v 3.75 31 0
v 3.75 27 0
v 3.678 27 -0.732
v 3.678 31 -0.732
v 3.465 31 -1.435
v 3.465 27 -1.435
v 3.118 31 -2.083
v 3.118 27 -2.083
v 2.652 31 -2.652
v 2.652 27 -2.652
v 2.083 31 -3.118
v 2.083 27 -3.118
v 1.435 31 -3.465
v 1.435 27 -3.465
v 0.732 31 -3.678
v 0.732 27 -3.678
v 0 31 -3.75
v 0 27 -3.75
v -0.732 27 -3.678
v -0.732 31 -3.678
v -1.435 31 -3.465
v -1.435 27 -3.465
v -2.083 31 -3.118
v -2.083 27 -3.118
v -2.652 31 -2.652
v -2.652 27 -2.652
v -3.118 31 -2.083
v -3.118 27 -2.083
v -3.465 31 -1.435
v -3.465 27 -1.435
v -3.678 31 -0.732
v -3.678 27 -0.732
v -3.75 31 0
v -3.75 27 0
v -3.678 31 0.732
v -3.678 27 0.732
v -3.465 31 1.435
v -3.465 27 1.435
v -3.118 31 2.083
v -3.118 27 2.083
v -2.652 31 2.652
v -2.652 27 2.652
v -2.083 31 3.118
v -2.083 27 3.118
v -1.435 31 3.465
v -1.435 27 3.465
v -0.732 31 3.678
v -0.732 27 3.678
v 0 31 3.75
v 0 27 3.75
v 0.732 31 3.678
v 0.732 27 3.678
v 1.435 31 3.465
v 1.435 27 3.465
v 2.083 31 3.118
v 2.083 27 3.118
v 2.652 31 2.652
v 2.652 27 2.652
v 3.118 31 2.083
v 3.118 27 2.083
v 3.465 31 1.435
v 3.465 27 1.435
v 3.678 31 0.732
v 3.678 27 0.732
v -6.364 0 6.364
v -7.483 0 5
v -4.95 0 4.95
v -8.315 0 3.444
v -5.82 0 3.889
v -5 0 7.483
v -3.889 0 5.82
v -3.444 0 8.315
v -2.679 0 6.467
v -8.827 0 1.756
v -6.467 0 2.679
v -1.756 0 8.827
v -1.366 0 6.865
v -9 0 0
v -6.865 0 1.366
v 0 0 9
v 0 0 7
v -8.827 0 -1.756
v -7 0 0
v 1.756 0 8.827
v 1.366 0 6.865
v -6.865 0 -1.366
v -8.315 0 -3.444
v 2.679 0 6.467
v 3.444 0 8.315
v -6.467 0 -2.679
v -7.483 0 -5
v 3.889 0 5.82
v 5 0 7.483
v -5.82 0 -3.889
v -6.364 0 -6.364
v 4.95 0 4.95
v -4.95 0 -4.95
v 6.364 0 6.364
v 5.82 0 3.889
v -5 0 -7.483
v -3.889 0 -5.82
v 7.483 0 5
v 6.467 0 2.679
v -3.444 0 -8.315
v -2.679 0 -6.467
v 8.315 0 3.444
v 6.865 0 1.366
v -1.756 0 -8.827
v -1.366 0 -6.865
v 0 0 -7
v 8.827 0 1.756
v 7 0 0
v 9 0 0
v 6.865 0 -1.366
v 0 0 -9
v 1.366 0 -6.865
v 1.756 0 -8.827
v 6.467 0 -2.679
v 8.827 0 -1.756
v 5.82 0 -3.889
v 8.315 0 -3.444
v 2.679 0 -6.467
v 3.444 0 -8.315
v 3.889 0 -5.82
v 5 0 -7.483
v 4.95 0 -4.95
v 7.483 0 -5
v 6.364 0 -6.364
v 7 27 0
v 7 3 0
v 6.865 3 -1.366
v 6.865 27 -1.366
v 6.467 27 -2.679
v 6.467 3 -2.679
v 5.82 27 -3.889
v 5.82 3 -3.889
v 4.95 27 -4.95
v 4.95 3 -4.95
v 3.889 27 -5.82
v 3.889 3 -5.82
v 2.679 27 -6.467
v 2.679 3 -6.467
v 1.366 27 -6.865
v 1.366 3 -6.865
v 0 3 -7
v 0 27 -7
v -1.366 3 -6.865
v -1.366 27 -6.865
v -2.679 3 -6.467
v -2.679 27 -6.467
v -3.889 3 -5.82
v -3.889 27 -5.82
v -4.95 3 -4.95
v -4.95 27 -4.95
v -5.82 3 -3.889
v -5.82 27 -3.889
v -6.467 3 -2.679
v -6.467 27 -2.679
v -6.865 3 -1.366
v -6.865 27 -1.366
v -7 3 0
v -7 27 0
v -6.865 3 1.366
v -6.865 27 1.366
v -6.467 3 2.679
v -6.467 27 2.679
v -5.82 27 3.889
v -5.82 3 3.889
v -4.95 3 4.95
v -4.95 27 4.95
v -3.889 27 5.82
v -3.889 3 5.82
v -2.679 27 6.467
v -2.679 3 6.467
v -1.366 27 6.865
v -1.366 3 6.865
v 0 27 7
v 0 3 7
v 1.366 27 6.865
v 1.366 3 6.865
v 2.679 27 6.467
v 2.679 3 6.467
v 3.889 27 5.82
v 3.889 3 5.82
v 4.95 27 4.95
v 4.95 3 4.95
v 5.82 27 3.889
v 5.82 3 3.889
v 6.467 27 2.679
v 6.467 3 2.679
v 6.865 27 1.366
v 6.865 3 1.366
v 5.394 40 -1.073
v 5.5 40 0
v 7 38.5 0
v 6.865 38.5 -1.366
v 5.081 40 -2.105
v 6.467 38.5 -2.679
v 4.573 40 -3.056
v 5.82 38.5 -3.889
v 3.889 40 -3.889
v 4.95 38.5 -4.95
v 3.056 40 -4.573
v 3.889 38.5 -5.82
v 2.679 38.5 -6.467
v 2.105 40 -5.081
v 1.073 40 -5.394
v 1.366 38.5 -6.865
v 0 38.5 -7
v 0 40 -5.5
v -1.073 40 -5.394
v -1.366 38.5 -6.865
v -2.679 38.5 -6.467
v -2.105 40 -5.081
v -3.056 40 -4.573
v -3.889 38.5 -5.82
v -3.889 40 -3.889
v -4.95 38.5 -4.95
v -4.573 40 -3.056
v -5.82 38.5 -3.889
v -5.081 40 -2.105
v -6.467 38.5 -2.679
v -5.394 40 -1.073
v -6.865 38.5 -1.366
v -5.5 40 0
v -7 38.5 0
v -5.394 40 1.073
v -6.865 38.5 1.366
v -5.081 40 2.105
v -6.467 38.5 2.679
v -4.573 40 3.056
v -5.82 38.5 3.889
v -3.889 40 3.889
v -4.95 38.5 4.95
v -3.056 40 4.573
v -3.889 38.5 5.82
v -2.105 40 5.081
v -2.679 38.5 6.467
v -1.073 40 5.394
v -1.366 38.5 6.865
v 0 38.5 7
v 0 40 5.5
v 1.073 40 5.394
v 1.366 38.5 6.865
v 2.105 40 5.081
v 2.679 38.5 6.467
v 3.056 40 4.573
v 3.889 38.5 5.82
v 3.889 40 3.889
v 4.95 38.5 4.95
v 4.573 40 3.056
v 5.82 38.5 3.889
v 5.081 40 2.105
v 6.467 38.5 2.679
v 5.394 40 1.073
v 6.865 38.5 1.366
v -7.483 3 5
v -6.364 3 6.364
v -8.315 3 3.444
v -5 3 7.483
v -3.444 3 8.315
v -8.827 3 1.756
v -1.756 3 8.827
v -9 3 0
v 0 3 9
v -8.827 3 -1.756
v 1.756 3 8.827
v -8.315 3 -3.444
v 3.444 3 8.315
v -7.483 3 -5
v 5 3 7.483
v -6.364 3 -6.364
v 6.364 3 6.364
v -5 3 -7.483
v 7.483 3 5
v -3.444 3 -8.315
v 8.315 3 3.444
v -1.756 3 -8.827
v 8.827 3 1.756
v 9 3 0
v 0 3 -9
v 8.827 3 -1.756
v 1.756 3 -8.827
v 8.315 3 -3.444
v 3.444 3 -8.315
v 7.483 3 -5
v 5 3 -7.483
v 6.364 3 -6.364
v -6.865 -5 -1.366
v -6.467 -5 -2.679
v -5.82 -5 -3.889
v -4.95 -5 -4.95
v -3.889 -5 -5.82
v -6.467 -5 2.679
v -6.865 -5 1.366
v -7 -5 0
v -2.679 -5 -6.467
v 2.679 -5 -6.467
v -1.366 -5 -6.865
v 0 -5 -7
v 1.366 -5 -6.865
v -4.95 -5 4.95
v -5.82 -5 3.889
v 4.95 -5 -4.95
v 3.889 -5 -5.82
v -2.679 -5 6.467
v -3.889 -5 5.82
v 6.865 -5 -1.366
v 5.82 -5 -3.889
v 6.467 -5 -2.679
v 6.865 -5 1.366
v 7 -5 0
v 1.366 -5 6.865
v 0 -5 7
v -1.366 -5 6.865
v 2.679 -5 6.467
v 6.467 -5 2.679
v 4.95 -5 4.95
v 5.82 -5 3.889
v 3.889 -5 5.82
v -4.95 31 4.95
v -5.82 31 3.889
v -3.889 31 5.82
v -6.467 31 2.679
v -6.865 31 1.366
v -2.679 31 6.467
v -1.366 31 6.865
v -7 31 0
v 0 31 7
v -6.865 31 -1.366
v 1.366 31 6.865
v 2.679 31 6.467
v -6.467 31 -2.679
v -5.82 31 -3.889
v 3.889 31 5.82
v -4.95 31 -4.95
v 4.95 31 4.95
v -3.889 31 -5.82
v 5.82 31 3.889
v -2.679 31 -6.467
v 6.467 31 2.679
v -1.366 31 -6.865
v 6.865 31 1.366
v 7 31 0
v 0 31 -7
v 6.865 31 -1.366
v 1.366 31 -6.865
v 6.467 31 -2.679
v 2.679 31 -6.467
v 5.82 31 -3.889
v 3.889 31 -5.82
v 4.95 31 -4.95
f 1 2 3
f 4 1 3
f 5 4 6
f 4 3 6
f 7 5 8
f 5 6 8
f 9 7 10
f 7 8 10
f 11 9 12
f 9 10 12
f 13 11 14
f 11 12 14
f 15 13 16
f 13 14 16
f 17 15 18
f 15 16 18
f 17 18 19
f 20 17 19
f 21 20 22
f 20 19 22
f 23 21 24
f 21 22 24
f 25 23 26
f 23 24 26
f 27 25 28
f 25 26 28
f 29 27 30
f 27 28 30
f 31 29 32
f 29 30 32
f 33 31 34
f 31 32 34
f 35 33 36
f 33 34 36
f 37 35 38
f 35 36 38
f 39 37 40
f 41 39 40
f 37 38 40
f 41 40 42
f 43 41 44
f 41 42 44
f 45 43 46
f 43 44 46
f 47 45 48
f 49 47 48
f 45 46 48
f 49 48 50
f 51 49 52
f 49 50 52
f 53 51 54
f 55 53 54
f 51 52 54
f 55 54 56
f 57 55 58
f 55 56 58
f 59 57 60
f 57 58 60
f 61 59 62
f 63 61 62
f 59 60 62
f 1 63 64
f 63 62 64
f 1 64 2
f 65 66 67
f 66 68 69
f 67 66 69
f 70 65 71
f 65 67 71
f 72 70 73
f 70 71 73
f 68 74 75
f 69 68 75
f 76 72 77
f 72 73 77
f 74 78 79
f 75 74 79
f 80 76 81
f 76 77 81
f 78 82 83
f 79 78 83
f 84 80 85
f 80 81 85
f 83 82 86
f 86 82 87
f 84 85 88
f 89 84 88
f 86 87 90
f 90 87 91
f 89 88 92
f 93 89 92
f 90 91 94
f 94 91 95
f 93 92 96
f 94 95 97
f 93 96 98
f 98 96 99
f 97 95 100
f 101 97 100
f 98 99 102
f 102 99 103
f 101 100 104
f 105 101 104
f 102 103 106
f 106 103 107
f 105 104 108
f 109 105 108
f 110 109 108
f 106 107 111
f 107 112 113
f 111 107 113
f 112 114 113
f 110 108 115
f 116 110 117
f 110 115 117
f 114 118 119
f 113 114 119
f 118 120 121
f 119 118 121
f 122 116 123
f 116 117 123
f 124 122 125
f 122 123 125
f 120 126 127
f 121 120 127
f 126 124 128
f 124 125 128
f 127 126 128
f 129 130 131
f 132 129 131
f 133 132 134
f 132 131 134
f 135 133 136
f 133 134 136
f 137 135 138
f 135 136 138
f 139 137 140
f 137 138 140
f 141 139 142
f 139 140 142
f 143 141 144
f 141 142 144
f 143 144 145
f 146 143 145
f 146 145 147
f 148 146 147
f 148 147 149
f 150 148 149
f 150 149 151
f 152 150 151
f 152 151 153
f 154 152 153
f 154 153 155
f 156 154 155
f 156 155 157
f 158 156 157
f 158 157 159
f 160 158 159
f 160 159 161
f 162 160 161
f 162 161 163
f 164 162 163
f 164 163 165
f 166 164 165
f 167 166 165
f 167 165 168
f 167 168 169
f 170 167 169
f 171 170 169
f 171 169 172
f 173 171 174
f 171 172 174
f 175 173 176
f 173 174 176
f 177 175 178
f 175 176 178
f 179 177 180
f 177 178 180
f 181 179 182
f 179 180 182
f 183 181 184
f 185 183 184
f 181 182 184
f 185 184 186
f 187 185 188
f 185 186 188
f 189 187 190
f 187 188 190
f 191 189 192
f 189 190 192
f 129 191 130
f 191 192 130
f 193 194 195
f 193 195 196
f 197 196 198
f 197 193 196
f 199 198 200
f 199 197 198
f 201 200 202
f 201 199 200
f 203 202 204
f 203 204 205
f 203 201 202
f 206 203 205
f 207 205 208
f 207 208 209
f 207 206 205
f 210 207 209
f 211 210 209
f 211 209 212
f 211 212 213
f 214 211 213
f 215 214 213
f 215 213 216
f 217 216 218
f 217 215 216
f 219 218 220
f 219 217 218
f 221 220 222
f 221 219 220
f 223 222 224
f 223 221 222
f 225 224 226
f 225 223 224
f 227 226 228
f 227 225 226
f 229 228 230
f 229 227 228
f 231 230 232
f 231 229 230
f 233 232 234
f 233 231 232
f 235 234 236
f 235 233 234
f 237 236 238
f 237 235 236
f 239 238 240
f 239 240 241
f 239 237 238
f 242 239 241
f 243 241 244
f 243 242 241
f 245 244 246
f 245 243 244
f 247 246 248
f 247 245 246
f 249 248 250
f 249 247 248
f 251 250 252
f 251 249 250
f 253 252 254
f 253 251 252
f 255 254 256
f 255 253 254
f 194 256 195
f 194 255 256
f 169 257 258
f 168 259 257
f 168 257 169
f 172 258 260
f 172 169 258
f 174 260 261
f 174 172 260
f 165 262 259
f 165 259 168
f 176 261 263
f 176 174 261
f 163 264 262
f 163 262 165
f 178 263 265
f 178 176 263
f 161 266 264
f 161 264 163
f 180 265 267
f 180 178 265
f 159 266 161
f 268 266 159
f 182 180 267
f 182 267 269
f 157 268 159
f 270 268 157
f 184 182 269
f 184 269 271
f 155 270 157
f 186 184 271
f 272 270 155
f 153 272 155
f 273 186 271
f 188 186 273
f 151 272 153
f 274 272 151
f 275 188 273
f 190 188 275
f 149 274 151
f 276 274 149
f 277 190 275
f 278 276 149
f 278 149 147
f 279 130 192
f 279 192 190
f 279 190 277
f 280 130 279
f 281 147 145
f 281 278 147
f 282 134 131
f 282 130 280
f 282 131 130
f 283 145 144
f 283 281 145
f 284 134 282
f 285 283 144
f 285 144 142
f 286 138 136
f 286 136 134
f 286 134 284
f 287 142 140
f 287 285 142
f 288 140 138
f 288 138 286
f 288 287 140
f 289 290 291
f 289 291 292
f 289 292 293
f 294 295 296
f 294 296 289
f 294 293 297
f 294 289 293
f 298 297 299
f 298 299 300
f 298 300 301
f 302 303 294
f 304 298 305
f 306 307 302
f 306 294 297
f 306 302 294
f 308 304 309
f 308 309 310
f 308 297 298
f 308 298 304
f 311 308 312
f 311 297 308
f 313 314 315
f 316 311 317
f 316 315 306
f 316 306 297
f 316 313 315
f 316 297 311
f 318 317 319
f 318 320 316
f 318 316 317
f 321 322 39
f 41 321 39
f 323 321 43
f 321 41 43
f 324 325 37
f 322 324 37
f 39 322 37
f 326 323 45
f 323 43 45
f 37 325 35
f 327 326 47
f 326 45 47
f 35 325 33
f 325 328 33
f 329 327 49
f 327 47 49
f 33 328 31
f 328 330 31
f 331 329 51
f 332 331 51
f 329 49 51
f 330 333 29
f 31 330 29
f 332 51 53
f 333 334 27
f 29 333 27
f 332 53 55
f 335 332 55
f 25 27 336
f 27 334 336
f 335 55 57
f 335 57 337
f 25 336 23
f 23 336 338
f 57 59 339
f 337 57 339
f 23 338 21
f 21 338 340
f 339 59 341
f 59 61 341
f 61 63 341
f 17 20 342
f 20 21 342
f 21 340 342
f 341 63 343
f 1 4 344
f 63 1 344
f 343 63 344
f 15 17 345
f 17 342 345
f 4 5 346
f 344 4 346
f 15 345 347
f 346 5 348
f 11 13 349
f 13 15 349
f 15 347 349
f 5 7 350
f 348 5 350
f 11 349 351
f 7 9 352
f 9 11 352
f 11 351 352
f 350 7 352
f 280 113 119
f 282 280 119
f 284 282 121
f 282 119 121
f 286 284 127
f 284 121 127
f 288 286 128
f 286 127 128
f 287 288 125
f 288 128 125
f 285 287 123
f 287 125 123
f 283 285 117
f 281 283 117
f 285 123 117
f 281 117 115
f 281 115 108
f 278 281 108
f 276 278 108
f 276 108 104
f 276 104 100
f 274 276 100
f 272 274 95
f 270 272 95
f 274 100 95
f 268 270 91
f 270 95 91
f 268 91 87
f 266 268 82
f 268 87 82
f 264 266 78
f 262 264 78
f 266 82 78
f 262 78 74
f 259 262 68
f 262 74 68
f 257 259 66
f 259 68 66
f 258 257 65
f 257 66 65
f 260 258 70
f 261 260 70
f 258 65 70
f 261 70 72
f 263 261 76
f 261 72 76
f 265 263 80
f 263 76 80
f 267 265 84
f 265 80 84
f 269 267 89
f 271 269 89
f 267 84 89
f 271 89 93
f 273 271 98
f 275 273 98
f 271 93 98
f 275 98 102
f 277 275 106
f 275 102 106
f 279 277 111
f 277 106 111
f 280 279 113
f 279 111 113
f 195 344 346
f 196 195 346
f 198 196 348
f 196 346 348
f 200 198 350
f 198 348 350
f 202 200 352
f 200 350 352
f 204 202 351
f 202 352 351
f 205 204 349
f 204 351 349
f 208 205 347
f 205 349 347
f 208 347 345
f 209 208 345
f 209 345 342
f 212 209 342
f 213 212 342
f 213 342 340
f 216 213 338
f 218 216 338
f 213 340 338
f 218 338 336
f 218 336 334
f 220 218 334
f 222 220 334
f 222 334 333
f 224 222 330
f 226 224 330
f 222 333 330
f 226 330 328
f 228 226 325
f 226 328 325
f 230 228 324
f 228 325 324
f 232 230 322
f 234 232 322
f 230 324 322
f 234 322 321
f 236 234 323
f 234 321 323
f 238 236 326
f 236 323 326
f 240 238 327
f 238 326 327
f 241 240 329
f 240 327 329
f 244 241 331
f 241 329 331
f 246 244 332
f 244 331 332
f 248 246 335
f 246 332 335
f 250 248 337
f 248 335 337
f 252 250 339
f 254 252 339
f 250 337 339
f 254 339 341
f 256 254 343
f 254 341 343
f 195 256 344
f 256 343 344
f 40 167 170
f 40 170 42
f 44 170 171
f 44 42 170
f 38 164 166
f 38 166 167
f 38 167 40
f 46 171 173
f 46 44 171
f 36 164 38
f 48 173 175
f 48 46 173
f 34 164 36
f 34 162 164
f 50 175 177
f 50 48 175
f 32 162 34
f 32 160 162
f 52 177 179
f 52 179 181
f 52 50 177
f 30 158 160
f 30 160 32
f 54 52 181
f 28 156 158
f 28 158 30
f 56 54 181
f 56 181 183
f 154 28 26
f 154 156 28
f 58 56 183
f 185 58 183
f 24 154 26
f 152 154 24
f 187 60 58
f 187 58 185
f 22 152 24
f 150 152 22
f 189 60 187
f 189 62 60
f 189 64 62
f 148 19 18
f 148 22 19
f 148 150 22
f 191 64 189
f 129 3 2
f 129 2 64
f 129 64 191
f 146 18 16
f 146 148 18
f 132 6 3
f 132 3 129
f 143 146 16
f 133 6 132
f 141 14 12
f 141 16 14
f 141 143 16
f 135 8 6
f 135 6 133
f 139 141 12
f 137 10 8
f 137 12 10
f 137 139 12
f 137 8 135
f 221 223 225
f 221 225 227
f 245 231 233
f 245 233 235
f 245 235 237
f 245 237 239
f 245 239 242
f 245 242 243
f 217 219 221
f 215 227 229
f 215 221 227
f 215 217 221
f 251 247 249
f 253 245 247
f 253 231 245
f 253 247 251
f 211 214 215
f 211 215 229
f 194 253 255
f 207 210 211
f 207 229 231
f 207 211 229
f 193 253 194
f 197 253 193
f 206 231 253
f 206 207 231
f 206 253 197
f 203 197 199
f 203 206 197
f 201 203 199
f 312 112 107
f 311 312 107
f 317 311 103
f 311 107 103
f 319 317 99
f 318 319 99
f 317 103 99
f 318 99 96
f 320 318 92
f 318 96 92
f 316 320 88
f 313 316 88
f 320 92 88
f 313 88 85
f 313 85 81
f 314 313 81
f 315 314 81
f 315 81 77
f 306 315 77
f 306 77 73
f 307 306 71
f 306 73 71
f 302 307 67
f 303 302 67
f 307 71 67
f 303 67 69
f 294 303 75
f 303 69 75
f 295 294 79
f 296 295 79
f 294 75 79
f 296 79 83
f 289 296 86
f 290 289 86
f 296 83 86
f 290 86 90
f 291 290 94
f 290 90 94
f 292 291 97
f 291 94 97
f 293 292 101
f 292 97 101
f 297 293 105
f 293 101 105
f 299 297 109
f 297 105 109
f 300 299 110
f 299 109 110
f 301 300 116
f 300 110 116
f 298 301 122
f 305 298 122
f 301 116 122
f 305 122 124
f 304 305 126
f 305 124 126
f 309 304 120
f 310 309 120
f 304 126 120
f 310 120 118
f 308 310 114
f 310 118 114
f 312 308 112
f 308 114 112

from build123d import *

# Parameters (mm, degrees)
CROQUIS1_R              = 9
SALIENTE_EXTRUIR1_DEPTH = 3
CROQUIS2_R              = 7
SALIENTE_EXTRUIR2_DEPTH = 27
CROQUIS4_R              = 3.75
SALIENTE_EXTRUIR3_DEPTH = 4
CROQUIS5_R              = 7
SALIENTE_EXTRUIR4_DEPTH = 9
CROQUIS7_R              = 7
SALIENTE_EXTRUIR5_DEPTH = 5
CHAFL_N1_SIZE           = 1.5


with BuildPart() as part:
    # Croquis1 → Saliente-Extruir1 (new body)
    with BuildSketch(Plane(origin=(0, 0, 0), x_dir=(1, 0, 0), z_dir=(0, 1, 0))):
        Circle(CROQUIS1_R)
    extrude(amount=SALIENTE_EXTRUIR1_DEPTH)

    # Croquis2 → Saliente-Extruir2 (add)
    with BuildSketch(Plane(origin=(0, 0, 0), x_dir=(1, 0, 0), z_dir=(0, 1, 0))):
        Circle(CROQUIS2_R)
    extrude(amount=SALIENTE_EXTRUIR2_DEPTH)

    # Croquis4 → Saliente-Extruir3 (add)
    with BuildSketch(Plane(origin=(0, 27, 0), x_dir=(1, 0, 0), z_dir=(0, 1, 0))):
        Circle(CROQUIS4_R)
    extrude(amount=SALIENTE_EXTRUIR3_DEPTH)

    # Croquis5 → Saliente-Extruir4 (add)
    with BuildSketch(Plane(origin=(0, 31, 0), x_dir=(1, 0, 0), z_dir=(0, 1, 0))):
        Circle(CROQUIS5_R)
    extrude(amount=SALIENTE_EXTRUIR4_DEPTH)

    # Croquis7 → Saliente-Extruir5 (add)
    with BuildSketch(Plane.XZ):
        Circle(CROQUIS7_R)
    extrude(amount=SALIENTE_EXTRUIR5_DEPTH)

    # Chaflán1
    chafl_n1_edges = [part.edges().sort_by_distance(p)[0] for p in [
        (-7, 40, 0),
    ]]
    chamfer(chafl_n1_edges, length=CHAFL_N1_SIZE)


solid = part.part
